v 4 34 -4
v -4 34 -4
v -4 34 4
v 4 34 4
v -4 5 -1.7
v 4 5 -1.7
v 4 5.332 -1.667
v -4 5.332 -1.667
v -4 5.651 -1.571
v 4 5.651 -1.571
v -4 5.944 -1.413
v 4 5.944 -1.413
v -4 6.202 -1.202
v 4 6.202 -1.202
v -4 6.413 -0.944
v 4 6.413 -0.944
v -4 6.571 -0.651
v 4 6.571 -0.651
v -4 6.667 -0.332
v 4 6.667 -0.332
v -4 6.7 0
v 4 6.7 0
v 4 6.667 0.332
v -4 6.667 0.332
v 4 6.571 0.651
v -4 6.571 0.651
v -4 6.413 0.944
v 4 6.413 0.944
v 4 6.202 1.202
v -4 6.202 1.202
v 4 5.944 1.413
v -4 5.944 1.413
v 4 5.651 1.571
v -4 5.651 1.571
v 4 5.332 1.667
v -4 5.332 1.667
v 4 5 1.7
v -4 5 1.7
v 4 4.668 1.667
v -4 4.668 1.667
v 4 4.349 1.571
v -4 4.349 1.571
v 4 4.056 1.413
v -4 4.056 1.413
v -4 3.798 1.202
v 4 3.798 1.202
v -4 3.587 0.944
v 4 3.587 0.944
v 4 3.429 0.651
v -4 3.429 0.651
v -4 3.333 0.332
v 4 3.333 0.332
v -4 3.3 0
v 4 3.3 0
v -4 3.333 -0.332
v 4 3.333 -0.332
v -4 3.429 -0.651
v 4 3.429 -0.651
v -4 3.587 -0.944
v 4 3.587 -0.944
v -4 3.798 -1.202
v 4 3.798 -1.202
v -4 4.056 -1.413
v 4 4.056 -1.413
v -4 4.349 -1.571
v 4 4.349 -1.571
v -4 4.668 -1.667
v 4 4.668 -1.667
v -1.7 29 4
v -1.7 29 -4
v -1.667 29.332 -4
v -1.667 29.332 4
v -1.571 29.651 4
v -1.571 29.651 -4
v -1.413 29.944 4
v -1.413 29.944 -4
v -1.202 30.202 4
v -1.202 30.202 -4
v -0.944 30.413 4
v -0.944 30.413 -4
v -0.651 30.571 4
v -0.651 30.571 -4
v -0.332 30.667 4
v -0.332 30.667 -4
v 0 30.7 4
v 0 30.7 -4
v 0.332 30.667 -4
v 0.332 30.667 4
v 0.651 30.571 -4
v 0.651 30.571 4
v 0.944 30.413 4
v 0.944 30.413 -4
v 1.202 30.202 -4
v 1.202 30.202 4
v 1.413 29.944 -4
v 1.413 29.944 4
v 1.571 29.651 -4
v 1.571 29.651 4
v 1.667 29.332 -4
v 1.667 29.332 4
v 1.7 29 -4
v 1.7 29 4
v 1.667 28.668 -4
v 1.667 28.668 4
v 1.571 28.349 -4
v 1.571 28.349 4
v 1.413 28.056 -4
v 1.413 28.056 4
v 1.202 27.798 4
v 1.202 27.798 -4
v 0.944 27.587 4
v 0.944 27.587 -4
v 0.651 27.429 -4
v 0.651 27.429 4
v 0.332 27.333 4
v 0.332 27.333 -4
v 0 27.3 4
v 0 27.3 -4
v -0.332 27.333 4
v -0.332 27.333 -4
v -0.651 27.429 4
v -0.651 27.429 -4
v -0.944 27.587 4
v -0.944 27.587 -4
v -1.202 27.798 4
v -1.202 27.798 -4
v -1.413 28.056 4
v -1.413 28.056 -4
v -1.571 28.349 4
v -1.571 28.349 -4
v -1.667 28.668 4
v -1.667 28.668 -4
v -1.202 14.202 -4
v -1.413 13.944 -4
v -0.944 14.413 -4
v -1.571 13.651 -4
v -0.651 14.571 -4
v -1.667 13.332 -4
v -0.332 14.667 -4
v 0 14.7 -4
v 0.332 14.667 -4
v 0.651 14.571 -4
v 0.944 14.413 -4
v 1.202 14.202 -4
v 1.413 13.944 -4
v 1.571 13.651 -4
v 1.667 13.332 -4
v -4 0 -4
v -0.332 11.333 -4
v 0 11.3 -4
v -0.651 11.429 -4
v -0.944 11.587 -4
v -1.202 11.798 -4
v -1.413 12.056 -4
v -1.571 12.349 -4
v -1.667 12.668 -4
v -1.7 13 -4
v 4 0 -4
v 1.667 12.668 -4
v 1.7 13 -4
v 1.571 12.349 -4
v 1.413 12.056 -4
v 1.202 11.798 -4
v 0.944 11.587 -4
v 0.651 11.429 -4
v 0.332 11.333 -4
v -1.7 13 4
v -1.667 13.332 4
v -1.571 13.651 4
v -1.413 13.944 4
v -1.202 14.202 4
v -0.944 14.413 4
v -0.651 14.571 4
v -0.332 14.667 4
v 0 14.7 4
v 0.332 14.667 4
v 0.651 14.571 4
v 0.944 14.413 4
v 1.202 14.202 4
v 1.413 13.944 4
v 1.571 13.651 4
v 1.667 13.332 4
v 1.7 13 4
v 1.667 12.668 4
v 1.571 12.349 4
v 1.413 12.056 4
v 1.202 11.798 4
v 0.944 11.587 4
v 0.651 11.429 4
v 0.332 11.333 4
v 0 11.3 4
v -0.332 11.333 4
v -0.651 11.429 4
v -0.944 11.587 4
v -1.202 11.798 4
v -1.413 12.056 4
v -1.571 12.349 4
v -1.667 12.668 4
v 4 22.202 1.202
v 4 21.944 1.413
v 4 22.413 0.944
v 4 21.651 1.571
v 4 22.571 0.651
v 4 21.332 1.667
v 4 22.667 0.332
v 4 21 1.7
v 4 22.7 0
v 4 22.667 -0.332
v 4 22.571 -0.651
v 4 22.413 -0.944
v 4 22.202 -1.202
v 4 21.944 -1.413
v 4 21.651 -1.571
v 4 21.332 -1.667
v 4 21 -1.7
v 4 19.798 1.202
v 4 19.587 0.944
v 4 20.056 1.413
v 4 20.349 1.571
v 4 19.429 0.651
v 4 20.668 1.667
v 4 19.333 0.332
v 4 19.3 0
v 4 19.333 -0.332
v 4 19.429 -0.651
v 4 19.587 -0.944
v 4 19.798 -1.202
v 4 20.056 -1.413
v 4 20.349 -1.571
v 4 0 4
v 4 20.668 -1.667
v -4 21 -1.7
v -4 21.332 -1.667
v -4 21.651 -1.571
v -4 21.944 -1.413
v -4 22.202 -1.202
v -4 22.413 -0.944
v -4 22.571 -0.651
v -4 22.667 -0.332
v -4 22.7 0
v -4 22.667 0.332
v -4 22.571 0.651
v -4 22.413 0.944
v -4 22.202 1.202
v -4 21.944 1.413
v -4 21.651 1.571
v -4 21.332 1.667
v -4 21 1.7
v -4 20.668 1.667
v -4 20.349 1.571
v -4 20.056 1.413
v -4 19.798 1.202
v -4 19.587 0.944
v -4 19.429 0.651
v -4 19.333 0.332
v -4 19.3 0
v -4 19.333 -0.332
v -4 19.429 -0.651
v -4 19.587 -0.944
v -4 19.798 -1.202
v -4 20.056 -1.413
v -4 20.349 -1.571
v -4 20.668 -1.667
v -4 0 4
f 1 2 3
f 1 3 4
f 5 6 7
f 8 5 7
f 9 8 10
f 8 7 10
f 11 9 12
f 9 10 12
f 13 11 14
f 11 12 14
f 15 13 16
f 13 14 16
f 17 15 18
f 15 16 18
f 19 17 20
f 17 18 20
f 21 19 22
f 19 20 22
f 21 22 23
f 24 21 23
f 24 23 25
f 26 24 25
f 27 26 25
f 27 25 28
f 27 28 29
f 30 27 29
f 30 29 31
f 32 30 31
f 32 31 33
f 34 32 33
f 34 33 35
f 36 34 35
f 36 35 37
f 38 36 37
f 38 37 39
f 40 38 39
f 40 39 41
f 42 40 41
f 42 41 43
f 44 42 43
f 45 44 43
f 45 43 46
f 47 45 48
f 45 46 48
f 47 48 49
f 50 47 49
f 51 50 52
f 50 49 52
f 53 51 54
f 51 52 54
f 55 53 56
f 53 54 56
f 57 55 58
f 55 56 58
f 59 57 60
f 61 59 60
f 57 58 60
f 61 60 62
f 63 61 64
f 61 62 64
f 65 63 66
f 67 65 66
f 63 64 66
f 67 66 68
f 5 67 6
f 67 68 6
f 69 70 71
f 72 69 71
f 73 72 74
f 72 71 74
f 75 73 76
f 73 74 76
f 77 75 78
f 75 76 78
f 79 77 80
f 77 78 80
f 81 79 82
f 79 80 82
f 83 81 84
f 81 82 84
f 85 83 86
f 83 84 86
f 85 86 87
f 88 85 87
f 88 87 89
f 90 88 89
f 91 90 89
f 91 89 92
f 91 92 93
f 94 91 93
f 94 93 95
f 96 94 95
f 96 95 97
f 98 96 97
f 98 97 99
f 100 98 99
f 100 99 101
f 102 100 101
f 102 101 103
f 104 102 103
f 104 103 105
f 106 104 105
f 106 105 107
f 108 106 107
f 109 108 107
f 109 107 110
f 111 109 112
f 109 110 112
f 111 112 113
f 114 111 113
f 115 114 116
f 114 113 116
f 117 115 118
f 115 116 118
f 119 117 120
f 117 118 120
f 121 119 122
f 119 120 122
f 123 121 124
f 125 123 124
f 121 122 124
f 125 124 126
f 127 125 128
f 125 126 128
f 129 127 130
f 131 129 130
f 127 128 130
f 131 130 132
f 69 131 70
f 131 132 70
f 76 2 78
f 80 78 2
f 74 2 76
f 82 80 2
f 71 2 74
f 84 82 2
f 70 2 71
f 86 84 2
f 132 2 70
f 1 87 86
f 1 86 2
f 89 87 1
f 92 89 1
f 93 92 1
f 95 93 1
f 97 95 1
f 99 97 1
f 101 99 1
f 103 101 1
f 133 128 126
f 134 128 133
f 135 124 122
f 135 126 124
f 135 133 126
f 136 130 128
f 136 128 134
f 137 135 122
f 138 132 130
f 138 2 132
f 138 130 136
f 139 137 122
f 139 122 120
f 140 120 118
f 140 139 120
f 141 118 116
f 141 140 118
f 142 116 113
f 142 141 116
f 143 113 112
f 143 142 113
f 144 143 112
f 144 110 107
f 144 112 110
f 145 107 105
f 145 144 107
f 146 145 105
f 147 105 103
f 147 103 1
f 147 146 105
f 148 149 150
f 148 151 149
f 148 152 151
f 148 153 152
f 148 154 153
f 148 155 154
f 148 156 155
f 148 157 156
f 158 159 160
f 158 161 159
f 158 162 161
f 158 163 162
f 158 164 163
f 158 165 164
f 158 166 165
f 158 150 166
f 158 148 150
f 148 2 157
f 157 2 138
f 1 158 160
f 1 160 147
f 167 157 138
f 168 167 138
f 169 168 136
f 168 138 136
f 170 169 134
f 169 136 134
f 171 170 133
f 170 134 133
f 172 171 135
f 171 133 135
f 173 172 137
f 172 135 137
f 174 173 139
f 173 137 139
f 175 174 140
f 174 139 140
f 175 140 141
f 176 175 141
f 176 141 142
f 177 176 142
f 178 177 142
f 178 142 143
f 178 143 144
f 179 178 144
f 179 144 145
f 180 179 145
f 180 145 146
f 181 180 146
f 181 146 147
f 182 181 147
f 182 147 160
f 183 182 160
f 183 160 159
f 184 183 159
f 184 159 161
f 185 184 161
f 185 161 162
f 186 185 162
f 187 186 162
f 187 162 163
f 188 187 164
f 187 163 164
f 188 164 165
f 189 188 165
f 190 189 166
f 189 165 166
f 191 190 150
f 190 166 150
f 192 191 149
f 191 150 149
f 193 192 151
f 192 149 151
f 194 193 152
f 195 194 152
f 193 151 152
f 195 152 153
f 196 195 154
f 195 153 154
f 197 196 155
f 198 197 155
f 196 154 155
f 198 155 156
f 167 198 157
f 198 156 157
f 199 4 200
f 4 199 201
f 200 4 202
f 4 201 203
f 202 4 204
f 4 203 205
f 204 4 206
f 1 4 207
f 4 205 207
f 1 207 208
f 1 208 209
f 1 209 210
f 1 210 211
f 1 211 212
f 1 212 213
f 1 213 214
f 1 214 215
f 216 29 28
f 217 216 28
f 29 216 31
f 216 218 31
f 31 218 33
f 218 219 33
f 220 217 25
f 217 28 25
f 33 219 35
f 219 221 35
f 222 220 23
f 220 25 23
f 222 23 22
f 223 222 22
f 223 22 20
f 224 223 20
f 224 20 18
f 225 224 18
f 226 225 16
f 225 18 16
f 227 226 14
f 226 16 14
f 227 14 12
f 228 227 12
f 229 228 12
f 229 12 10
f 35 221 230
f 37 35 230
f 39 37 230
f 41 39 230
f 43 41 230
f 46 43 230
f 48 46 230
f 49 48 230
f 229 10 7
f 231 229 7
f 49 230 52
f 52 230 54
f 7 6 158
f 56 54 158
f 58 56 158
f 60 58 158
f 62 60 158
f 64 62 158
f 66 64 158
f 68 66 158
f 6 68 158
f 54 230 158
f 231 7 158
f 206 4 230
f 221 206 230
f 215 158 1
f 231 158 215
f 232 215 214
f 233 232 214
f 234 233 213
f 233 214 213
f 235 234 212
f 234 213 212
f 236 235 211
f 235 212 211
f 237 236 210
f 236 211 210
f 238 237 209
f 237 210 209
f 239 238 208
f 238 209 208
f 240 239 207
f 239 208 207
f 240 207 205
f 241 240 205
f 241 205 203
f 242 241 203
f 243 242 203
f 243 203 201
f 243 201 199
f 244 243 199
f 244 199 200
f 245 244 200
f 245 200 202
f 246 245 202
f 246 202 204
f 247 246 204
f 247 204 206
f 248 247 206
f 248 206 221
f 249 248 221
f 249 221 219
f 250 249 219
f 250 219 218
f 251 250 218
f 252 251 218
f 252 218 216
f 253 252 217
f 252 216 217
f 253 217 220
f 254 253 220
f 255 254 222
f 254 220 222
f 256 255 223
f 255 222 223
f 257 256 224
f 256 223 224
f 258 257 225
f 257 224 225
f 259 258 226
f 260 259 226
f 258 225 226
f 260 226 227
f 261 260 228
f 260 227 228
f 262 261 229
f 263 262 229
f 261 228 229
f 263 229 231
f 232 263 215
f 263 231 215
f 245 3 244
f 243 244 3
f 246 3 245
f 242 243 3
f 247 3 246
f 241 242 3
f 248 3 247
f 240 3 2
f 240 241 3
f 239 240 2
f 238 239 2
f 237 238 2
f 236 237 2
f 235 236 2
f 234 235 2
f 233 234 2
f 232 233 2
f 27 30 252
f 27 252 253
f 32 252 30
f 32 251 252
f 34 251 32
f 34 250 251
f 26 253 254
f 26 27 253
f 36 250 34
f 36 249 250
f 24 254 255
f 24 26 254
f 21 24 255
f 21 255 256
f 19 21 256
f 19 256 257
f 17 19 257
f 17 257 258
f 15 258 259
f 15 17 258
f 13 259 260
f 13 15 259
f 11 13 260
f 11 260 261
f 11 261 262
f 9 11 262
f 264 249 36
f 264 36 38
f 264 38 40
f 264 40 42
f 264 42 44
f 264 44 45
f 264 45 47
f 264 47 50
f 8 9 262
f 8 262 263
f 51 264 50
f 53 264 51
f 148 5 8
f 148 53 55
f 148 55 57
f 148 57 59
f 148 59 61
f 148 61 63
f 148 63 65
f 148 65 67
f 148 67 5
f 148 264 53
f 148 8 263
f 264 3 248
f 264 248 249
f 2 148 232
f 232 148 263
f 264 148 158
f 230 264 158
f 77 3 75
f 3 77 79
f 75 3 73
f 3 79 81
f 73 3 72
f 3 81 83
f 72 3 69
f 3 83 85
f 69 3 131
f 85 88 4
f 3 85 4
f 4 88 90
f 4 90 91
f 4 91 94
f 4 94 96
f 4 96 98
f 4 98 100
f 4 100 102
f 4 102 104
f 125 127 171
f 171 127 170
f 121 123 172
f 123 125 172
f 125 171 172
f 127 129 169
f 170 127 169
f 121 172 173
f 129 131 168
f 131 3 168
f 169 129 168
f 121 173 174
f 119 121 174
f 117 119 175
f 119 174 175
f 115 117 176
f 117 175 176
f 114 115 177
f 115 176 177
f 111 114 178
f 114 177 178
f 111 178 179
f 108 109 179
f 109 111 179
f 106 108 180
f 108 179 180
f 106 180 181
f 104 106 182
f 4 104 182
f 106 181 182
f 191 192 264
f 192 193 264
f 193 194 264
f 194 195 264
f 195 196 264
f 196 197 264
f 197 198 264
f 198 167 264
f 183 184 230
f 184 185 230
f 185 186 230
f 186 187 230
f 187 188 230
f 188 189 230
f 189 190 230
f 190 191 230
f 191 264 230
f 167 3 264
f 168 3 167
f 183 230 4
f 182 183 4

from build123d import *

# Parameters (mm, degrees)
SKETCH_1_W          = 8
SKETCH_1_H          = 8
EXTRUDE_1_DEPTH     = 34
SKETCH_2_R          = 1.7
CUT_EXTRUDE_1_DEPTH = 34
SKETCH_3_R          = 1.7
CUT_EXTRUDE_2_DEPTH = 34


with BuildPart() as part:
    # 草图1 → 凸台-拉伸1 (new body)
    with BuildSketch(Plane(origin=(0, 0, 0), x_dir=(1, 0, 0), z_dir=(0, 1, 0))):
        Rectangle(SKETCH_1_W, SKETCH_1_H)
    extrude(amount=EXTRUDE_1_DEPTH)

    # 草图2 → 切除-拉伸1 (cut)
    with BuildSketch(Plane(origin=(0, 0, -4), x_dir=(-1, 0, 0), z_dir=(0, 0, -1))):
        with Locations((0, 29)):
            Circle(SKETCH_2_R)
        with Locations((0, 13)):
            Circle(SKETCH_2_R)
    extrude(amount=-CUT_EXTRUDE_1_DEPTH, mode=Mode.SUBTRACT)

    # 草图3 → 切除-拉伸2 (cut)
    with BuildSketch(Plane(origin=(4, 0, 0), x_dir=(0, 0, -1), z_dir=(1, 0, 0))):
        with Locations((0, 5)):
            Circle(SKETCH_3_R)
        with Locations((0, 21)):
            Circle(SKETCH_3_R)
    extrude(amount=-CUT_EXTRUDE_2_DEPTH, mode=Mode.SUBTRACT)


solid = part.part
